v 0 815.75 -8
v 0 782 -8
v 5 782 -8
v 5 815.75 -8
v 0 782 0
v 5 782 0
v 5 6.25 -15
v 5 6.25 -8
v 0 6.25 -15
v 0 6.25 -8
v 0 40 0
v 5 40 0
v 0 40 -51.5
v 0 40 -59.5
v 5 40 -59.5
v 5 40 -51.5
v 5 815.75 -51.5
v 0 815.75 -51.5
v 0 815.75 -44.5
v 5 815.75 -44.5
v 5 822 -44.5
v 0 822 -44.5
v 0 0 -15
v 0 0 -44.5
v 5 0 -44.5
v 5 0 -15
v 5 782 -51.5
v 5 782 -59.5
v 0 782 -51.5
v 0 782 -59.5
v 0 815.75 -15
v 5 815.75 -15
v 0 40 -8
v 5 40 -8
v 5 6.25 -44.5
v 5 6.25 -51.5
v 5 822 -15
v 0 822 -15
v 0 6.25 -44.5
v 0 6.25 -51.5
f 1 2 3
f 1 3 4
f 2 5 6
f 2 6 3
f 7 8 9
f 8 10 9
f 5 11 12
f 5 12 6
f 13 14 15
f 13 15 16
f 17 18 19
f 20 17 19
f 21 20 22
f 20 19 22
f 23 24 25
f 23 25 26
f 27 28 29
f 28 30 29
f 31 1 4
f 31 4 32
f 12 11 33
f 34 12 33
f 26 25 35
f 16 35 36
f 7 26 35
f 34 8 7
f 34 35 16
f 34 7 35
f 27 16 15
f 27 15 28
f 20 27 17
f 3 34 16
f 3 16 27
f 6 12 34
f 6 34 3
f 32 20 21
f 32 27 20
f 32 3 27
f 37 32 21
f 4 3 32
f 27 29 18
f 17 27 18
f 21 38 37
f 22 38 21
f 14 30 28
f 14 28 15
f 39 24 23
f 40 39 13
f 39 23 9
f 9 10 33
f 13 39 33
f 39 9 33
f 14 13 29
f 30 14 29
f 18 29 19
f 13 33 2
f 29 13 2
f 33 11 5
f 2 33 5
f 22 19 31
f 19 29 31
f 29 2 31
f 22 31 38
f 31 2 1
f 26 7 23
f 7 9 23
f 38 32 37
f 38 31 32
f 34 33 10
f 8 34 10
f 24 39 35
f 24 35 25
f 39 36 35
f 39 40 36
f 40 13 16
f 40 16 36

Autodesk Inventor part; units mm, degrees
ref_plane "YZ Plane" through (0, 0, 0) normal (1, 0, 0) x (0, 1, 0)
ref_plane "XZ Plane" through (0, 0, 0) normal (0, 1, 0) x (-1, 0, 0)
ref_plane "XY Plane" through (0, 0, 0) normal (0, 0, 1) x (1, 0, 0)
sketch "Sketch1" plane through (0, 0, 0) normal (1, 0, 0) x (0, 1, 0)
  line L0 (0, 0) -> (822, 0)
  line L1 (822, 0) -> (822, -59.5)
  line L2 (822, -59.5) -> (0, -59.5)
  line L3 (0, -59.5) -> (0, 0)
  line L4 (822, 0) -> (815.75, 0)
  line L5 (815.75, 0) -> (815.75, -15)
  line L6 (815.75, -15) -> (822, -15)
  line L7 (822, -15) -> (822, 0)
  line L8 (822, 0) -> (782, 0)
  line L9 (782, 0) -> (782, -8)
  line L10 (782, -8) -> (822, -8)
  line L11 (822, -8) -> (822, 0)
  line L12 (856.5319, -29.75) -> (-65.1606, -29.75) construction
  line L13 (411, 165.682) -> (411, -1074.2454) construction
  line L14 (822, -59.5) -> (815.75, -59.5)
  line L15 (815.75, -59.5) -> (815.75, -44.5)
  line L16 (815.75, -44.5) -> (822, -44.5)
  line L17 (822, -44.5) -> (822, -59.5)
  line L18 (822, -59.5) -> (782, -59.5)
  line L19 (782, -59.5) -> (782, -51.5)
  line L20 (782, -51.5) -> (822, -51.5)
  line L21 (822, -51.5) -> (822, -59.5)
  line L22 (0, 0) -> (0, -59.5)
  line L23 (0, 0) -> (6.25, 0)
  line L24 (6.25, 0) -> (6.25, -15)
  line L25 (6.25, -15) -> (0, -15)
  line L26 (0, -15) -> (0, 0)
  line L27 (0, 0) -> (40, 0)
  line L28 (40, 0) -> (40, -8)
  line L29 (40, -8) -> (0, -8)
  line L30 (0, -8) -> (0, 0)
  line L31 (6.25, -44.5) -> (0, -44.5)
  line L32 (40, -51.5) -> (0, -51.5)
  line L33 (0, -59.5) -> (6.25, -59.5)
  line L34 (6.25, -59.5) -> (6.25, -44.5)
  line L35 (0, -44.5) -> (0, -59.5)
  line L36 (0, -59.5) -> (40, -59.5)
  line L37 (40, -59.5) -> (40, -51.5)
  line L38 (0, -51.5) -> (0, -59.5)
  point P0 (40, -59.5)
  point P1 (782, -59.5)
  point P2 (815.75, -51.5)
  point P3 (822, -44.5)
  point P4 (822, -15)
  point P5 (815.75, -8)
  point P6 (782, 0)
  point P7 (40, 0)
  point P8 (6.25, -8)
  point P9 (0, -15)
  point P10 (0, -44.5)
  point P11 (6.25, -51.5)
  dimension "d0" = 822
  dimension "d1" = 59.5
  dimension "d2" = 15
  dimension "d3" = 40
  dimension "d4" = 8
  dimension "d5" = 6.25
  dimension "d6" = 29.75
  dimension "d7" = 411
extrude "Extrusion1" add sketch "Sketch1" along normal blind 5 contours L0 L9 L10 L5 L6 L1 L16 L15 L20 L19 L2 L37 L32 L34 L31 L3 L25 L24 L29 L28
equation "\"d6\" = 0.5 * d1"
equation "\"d7\" = 0.5 * d0"
properties part number "Acrly_Wand_1"
